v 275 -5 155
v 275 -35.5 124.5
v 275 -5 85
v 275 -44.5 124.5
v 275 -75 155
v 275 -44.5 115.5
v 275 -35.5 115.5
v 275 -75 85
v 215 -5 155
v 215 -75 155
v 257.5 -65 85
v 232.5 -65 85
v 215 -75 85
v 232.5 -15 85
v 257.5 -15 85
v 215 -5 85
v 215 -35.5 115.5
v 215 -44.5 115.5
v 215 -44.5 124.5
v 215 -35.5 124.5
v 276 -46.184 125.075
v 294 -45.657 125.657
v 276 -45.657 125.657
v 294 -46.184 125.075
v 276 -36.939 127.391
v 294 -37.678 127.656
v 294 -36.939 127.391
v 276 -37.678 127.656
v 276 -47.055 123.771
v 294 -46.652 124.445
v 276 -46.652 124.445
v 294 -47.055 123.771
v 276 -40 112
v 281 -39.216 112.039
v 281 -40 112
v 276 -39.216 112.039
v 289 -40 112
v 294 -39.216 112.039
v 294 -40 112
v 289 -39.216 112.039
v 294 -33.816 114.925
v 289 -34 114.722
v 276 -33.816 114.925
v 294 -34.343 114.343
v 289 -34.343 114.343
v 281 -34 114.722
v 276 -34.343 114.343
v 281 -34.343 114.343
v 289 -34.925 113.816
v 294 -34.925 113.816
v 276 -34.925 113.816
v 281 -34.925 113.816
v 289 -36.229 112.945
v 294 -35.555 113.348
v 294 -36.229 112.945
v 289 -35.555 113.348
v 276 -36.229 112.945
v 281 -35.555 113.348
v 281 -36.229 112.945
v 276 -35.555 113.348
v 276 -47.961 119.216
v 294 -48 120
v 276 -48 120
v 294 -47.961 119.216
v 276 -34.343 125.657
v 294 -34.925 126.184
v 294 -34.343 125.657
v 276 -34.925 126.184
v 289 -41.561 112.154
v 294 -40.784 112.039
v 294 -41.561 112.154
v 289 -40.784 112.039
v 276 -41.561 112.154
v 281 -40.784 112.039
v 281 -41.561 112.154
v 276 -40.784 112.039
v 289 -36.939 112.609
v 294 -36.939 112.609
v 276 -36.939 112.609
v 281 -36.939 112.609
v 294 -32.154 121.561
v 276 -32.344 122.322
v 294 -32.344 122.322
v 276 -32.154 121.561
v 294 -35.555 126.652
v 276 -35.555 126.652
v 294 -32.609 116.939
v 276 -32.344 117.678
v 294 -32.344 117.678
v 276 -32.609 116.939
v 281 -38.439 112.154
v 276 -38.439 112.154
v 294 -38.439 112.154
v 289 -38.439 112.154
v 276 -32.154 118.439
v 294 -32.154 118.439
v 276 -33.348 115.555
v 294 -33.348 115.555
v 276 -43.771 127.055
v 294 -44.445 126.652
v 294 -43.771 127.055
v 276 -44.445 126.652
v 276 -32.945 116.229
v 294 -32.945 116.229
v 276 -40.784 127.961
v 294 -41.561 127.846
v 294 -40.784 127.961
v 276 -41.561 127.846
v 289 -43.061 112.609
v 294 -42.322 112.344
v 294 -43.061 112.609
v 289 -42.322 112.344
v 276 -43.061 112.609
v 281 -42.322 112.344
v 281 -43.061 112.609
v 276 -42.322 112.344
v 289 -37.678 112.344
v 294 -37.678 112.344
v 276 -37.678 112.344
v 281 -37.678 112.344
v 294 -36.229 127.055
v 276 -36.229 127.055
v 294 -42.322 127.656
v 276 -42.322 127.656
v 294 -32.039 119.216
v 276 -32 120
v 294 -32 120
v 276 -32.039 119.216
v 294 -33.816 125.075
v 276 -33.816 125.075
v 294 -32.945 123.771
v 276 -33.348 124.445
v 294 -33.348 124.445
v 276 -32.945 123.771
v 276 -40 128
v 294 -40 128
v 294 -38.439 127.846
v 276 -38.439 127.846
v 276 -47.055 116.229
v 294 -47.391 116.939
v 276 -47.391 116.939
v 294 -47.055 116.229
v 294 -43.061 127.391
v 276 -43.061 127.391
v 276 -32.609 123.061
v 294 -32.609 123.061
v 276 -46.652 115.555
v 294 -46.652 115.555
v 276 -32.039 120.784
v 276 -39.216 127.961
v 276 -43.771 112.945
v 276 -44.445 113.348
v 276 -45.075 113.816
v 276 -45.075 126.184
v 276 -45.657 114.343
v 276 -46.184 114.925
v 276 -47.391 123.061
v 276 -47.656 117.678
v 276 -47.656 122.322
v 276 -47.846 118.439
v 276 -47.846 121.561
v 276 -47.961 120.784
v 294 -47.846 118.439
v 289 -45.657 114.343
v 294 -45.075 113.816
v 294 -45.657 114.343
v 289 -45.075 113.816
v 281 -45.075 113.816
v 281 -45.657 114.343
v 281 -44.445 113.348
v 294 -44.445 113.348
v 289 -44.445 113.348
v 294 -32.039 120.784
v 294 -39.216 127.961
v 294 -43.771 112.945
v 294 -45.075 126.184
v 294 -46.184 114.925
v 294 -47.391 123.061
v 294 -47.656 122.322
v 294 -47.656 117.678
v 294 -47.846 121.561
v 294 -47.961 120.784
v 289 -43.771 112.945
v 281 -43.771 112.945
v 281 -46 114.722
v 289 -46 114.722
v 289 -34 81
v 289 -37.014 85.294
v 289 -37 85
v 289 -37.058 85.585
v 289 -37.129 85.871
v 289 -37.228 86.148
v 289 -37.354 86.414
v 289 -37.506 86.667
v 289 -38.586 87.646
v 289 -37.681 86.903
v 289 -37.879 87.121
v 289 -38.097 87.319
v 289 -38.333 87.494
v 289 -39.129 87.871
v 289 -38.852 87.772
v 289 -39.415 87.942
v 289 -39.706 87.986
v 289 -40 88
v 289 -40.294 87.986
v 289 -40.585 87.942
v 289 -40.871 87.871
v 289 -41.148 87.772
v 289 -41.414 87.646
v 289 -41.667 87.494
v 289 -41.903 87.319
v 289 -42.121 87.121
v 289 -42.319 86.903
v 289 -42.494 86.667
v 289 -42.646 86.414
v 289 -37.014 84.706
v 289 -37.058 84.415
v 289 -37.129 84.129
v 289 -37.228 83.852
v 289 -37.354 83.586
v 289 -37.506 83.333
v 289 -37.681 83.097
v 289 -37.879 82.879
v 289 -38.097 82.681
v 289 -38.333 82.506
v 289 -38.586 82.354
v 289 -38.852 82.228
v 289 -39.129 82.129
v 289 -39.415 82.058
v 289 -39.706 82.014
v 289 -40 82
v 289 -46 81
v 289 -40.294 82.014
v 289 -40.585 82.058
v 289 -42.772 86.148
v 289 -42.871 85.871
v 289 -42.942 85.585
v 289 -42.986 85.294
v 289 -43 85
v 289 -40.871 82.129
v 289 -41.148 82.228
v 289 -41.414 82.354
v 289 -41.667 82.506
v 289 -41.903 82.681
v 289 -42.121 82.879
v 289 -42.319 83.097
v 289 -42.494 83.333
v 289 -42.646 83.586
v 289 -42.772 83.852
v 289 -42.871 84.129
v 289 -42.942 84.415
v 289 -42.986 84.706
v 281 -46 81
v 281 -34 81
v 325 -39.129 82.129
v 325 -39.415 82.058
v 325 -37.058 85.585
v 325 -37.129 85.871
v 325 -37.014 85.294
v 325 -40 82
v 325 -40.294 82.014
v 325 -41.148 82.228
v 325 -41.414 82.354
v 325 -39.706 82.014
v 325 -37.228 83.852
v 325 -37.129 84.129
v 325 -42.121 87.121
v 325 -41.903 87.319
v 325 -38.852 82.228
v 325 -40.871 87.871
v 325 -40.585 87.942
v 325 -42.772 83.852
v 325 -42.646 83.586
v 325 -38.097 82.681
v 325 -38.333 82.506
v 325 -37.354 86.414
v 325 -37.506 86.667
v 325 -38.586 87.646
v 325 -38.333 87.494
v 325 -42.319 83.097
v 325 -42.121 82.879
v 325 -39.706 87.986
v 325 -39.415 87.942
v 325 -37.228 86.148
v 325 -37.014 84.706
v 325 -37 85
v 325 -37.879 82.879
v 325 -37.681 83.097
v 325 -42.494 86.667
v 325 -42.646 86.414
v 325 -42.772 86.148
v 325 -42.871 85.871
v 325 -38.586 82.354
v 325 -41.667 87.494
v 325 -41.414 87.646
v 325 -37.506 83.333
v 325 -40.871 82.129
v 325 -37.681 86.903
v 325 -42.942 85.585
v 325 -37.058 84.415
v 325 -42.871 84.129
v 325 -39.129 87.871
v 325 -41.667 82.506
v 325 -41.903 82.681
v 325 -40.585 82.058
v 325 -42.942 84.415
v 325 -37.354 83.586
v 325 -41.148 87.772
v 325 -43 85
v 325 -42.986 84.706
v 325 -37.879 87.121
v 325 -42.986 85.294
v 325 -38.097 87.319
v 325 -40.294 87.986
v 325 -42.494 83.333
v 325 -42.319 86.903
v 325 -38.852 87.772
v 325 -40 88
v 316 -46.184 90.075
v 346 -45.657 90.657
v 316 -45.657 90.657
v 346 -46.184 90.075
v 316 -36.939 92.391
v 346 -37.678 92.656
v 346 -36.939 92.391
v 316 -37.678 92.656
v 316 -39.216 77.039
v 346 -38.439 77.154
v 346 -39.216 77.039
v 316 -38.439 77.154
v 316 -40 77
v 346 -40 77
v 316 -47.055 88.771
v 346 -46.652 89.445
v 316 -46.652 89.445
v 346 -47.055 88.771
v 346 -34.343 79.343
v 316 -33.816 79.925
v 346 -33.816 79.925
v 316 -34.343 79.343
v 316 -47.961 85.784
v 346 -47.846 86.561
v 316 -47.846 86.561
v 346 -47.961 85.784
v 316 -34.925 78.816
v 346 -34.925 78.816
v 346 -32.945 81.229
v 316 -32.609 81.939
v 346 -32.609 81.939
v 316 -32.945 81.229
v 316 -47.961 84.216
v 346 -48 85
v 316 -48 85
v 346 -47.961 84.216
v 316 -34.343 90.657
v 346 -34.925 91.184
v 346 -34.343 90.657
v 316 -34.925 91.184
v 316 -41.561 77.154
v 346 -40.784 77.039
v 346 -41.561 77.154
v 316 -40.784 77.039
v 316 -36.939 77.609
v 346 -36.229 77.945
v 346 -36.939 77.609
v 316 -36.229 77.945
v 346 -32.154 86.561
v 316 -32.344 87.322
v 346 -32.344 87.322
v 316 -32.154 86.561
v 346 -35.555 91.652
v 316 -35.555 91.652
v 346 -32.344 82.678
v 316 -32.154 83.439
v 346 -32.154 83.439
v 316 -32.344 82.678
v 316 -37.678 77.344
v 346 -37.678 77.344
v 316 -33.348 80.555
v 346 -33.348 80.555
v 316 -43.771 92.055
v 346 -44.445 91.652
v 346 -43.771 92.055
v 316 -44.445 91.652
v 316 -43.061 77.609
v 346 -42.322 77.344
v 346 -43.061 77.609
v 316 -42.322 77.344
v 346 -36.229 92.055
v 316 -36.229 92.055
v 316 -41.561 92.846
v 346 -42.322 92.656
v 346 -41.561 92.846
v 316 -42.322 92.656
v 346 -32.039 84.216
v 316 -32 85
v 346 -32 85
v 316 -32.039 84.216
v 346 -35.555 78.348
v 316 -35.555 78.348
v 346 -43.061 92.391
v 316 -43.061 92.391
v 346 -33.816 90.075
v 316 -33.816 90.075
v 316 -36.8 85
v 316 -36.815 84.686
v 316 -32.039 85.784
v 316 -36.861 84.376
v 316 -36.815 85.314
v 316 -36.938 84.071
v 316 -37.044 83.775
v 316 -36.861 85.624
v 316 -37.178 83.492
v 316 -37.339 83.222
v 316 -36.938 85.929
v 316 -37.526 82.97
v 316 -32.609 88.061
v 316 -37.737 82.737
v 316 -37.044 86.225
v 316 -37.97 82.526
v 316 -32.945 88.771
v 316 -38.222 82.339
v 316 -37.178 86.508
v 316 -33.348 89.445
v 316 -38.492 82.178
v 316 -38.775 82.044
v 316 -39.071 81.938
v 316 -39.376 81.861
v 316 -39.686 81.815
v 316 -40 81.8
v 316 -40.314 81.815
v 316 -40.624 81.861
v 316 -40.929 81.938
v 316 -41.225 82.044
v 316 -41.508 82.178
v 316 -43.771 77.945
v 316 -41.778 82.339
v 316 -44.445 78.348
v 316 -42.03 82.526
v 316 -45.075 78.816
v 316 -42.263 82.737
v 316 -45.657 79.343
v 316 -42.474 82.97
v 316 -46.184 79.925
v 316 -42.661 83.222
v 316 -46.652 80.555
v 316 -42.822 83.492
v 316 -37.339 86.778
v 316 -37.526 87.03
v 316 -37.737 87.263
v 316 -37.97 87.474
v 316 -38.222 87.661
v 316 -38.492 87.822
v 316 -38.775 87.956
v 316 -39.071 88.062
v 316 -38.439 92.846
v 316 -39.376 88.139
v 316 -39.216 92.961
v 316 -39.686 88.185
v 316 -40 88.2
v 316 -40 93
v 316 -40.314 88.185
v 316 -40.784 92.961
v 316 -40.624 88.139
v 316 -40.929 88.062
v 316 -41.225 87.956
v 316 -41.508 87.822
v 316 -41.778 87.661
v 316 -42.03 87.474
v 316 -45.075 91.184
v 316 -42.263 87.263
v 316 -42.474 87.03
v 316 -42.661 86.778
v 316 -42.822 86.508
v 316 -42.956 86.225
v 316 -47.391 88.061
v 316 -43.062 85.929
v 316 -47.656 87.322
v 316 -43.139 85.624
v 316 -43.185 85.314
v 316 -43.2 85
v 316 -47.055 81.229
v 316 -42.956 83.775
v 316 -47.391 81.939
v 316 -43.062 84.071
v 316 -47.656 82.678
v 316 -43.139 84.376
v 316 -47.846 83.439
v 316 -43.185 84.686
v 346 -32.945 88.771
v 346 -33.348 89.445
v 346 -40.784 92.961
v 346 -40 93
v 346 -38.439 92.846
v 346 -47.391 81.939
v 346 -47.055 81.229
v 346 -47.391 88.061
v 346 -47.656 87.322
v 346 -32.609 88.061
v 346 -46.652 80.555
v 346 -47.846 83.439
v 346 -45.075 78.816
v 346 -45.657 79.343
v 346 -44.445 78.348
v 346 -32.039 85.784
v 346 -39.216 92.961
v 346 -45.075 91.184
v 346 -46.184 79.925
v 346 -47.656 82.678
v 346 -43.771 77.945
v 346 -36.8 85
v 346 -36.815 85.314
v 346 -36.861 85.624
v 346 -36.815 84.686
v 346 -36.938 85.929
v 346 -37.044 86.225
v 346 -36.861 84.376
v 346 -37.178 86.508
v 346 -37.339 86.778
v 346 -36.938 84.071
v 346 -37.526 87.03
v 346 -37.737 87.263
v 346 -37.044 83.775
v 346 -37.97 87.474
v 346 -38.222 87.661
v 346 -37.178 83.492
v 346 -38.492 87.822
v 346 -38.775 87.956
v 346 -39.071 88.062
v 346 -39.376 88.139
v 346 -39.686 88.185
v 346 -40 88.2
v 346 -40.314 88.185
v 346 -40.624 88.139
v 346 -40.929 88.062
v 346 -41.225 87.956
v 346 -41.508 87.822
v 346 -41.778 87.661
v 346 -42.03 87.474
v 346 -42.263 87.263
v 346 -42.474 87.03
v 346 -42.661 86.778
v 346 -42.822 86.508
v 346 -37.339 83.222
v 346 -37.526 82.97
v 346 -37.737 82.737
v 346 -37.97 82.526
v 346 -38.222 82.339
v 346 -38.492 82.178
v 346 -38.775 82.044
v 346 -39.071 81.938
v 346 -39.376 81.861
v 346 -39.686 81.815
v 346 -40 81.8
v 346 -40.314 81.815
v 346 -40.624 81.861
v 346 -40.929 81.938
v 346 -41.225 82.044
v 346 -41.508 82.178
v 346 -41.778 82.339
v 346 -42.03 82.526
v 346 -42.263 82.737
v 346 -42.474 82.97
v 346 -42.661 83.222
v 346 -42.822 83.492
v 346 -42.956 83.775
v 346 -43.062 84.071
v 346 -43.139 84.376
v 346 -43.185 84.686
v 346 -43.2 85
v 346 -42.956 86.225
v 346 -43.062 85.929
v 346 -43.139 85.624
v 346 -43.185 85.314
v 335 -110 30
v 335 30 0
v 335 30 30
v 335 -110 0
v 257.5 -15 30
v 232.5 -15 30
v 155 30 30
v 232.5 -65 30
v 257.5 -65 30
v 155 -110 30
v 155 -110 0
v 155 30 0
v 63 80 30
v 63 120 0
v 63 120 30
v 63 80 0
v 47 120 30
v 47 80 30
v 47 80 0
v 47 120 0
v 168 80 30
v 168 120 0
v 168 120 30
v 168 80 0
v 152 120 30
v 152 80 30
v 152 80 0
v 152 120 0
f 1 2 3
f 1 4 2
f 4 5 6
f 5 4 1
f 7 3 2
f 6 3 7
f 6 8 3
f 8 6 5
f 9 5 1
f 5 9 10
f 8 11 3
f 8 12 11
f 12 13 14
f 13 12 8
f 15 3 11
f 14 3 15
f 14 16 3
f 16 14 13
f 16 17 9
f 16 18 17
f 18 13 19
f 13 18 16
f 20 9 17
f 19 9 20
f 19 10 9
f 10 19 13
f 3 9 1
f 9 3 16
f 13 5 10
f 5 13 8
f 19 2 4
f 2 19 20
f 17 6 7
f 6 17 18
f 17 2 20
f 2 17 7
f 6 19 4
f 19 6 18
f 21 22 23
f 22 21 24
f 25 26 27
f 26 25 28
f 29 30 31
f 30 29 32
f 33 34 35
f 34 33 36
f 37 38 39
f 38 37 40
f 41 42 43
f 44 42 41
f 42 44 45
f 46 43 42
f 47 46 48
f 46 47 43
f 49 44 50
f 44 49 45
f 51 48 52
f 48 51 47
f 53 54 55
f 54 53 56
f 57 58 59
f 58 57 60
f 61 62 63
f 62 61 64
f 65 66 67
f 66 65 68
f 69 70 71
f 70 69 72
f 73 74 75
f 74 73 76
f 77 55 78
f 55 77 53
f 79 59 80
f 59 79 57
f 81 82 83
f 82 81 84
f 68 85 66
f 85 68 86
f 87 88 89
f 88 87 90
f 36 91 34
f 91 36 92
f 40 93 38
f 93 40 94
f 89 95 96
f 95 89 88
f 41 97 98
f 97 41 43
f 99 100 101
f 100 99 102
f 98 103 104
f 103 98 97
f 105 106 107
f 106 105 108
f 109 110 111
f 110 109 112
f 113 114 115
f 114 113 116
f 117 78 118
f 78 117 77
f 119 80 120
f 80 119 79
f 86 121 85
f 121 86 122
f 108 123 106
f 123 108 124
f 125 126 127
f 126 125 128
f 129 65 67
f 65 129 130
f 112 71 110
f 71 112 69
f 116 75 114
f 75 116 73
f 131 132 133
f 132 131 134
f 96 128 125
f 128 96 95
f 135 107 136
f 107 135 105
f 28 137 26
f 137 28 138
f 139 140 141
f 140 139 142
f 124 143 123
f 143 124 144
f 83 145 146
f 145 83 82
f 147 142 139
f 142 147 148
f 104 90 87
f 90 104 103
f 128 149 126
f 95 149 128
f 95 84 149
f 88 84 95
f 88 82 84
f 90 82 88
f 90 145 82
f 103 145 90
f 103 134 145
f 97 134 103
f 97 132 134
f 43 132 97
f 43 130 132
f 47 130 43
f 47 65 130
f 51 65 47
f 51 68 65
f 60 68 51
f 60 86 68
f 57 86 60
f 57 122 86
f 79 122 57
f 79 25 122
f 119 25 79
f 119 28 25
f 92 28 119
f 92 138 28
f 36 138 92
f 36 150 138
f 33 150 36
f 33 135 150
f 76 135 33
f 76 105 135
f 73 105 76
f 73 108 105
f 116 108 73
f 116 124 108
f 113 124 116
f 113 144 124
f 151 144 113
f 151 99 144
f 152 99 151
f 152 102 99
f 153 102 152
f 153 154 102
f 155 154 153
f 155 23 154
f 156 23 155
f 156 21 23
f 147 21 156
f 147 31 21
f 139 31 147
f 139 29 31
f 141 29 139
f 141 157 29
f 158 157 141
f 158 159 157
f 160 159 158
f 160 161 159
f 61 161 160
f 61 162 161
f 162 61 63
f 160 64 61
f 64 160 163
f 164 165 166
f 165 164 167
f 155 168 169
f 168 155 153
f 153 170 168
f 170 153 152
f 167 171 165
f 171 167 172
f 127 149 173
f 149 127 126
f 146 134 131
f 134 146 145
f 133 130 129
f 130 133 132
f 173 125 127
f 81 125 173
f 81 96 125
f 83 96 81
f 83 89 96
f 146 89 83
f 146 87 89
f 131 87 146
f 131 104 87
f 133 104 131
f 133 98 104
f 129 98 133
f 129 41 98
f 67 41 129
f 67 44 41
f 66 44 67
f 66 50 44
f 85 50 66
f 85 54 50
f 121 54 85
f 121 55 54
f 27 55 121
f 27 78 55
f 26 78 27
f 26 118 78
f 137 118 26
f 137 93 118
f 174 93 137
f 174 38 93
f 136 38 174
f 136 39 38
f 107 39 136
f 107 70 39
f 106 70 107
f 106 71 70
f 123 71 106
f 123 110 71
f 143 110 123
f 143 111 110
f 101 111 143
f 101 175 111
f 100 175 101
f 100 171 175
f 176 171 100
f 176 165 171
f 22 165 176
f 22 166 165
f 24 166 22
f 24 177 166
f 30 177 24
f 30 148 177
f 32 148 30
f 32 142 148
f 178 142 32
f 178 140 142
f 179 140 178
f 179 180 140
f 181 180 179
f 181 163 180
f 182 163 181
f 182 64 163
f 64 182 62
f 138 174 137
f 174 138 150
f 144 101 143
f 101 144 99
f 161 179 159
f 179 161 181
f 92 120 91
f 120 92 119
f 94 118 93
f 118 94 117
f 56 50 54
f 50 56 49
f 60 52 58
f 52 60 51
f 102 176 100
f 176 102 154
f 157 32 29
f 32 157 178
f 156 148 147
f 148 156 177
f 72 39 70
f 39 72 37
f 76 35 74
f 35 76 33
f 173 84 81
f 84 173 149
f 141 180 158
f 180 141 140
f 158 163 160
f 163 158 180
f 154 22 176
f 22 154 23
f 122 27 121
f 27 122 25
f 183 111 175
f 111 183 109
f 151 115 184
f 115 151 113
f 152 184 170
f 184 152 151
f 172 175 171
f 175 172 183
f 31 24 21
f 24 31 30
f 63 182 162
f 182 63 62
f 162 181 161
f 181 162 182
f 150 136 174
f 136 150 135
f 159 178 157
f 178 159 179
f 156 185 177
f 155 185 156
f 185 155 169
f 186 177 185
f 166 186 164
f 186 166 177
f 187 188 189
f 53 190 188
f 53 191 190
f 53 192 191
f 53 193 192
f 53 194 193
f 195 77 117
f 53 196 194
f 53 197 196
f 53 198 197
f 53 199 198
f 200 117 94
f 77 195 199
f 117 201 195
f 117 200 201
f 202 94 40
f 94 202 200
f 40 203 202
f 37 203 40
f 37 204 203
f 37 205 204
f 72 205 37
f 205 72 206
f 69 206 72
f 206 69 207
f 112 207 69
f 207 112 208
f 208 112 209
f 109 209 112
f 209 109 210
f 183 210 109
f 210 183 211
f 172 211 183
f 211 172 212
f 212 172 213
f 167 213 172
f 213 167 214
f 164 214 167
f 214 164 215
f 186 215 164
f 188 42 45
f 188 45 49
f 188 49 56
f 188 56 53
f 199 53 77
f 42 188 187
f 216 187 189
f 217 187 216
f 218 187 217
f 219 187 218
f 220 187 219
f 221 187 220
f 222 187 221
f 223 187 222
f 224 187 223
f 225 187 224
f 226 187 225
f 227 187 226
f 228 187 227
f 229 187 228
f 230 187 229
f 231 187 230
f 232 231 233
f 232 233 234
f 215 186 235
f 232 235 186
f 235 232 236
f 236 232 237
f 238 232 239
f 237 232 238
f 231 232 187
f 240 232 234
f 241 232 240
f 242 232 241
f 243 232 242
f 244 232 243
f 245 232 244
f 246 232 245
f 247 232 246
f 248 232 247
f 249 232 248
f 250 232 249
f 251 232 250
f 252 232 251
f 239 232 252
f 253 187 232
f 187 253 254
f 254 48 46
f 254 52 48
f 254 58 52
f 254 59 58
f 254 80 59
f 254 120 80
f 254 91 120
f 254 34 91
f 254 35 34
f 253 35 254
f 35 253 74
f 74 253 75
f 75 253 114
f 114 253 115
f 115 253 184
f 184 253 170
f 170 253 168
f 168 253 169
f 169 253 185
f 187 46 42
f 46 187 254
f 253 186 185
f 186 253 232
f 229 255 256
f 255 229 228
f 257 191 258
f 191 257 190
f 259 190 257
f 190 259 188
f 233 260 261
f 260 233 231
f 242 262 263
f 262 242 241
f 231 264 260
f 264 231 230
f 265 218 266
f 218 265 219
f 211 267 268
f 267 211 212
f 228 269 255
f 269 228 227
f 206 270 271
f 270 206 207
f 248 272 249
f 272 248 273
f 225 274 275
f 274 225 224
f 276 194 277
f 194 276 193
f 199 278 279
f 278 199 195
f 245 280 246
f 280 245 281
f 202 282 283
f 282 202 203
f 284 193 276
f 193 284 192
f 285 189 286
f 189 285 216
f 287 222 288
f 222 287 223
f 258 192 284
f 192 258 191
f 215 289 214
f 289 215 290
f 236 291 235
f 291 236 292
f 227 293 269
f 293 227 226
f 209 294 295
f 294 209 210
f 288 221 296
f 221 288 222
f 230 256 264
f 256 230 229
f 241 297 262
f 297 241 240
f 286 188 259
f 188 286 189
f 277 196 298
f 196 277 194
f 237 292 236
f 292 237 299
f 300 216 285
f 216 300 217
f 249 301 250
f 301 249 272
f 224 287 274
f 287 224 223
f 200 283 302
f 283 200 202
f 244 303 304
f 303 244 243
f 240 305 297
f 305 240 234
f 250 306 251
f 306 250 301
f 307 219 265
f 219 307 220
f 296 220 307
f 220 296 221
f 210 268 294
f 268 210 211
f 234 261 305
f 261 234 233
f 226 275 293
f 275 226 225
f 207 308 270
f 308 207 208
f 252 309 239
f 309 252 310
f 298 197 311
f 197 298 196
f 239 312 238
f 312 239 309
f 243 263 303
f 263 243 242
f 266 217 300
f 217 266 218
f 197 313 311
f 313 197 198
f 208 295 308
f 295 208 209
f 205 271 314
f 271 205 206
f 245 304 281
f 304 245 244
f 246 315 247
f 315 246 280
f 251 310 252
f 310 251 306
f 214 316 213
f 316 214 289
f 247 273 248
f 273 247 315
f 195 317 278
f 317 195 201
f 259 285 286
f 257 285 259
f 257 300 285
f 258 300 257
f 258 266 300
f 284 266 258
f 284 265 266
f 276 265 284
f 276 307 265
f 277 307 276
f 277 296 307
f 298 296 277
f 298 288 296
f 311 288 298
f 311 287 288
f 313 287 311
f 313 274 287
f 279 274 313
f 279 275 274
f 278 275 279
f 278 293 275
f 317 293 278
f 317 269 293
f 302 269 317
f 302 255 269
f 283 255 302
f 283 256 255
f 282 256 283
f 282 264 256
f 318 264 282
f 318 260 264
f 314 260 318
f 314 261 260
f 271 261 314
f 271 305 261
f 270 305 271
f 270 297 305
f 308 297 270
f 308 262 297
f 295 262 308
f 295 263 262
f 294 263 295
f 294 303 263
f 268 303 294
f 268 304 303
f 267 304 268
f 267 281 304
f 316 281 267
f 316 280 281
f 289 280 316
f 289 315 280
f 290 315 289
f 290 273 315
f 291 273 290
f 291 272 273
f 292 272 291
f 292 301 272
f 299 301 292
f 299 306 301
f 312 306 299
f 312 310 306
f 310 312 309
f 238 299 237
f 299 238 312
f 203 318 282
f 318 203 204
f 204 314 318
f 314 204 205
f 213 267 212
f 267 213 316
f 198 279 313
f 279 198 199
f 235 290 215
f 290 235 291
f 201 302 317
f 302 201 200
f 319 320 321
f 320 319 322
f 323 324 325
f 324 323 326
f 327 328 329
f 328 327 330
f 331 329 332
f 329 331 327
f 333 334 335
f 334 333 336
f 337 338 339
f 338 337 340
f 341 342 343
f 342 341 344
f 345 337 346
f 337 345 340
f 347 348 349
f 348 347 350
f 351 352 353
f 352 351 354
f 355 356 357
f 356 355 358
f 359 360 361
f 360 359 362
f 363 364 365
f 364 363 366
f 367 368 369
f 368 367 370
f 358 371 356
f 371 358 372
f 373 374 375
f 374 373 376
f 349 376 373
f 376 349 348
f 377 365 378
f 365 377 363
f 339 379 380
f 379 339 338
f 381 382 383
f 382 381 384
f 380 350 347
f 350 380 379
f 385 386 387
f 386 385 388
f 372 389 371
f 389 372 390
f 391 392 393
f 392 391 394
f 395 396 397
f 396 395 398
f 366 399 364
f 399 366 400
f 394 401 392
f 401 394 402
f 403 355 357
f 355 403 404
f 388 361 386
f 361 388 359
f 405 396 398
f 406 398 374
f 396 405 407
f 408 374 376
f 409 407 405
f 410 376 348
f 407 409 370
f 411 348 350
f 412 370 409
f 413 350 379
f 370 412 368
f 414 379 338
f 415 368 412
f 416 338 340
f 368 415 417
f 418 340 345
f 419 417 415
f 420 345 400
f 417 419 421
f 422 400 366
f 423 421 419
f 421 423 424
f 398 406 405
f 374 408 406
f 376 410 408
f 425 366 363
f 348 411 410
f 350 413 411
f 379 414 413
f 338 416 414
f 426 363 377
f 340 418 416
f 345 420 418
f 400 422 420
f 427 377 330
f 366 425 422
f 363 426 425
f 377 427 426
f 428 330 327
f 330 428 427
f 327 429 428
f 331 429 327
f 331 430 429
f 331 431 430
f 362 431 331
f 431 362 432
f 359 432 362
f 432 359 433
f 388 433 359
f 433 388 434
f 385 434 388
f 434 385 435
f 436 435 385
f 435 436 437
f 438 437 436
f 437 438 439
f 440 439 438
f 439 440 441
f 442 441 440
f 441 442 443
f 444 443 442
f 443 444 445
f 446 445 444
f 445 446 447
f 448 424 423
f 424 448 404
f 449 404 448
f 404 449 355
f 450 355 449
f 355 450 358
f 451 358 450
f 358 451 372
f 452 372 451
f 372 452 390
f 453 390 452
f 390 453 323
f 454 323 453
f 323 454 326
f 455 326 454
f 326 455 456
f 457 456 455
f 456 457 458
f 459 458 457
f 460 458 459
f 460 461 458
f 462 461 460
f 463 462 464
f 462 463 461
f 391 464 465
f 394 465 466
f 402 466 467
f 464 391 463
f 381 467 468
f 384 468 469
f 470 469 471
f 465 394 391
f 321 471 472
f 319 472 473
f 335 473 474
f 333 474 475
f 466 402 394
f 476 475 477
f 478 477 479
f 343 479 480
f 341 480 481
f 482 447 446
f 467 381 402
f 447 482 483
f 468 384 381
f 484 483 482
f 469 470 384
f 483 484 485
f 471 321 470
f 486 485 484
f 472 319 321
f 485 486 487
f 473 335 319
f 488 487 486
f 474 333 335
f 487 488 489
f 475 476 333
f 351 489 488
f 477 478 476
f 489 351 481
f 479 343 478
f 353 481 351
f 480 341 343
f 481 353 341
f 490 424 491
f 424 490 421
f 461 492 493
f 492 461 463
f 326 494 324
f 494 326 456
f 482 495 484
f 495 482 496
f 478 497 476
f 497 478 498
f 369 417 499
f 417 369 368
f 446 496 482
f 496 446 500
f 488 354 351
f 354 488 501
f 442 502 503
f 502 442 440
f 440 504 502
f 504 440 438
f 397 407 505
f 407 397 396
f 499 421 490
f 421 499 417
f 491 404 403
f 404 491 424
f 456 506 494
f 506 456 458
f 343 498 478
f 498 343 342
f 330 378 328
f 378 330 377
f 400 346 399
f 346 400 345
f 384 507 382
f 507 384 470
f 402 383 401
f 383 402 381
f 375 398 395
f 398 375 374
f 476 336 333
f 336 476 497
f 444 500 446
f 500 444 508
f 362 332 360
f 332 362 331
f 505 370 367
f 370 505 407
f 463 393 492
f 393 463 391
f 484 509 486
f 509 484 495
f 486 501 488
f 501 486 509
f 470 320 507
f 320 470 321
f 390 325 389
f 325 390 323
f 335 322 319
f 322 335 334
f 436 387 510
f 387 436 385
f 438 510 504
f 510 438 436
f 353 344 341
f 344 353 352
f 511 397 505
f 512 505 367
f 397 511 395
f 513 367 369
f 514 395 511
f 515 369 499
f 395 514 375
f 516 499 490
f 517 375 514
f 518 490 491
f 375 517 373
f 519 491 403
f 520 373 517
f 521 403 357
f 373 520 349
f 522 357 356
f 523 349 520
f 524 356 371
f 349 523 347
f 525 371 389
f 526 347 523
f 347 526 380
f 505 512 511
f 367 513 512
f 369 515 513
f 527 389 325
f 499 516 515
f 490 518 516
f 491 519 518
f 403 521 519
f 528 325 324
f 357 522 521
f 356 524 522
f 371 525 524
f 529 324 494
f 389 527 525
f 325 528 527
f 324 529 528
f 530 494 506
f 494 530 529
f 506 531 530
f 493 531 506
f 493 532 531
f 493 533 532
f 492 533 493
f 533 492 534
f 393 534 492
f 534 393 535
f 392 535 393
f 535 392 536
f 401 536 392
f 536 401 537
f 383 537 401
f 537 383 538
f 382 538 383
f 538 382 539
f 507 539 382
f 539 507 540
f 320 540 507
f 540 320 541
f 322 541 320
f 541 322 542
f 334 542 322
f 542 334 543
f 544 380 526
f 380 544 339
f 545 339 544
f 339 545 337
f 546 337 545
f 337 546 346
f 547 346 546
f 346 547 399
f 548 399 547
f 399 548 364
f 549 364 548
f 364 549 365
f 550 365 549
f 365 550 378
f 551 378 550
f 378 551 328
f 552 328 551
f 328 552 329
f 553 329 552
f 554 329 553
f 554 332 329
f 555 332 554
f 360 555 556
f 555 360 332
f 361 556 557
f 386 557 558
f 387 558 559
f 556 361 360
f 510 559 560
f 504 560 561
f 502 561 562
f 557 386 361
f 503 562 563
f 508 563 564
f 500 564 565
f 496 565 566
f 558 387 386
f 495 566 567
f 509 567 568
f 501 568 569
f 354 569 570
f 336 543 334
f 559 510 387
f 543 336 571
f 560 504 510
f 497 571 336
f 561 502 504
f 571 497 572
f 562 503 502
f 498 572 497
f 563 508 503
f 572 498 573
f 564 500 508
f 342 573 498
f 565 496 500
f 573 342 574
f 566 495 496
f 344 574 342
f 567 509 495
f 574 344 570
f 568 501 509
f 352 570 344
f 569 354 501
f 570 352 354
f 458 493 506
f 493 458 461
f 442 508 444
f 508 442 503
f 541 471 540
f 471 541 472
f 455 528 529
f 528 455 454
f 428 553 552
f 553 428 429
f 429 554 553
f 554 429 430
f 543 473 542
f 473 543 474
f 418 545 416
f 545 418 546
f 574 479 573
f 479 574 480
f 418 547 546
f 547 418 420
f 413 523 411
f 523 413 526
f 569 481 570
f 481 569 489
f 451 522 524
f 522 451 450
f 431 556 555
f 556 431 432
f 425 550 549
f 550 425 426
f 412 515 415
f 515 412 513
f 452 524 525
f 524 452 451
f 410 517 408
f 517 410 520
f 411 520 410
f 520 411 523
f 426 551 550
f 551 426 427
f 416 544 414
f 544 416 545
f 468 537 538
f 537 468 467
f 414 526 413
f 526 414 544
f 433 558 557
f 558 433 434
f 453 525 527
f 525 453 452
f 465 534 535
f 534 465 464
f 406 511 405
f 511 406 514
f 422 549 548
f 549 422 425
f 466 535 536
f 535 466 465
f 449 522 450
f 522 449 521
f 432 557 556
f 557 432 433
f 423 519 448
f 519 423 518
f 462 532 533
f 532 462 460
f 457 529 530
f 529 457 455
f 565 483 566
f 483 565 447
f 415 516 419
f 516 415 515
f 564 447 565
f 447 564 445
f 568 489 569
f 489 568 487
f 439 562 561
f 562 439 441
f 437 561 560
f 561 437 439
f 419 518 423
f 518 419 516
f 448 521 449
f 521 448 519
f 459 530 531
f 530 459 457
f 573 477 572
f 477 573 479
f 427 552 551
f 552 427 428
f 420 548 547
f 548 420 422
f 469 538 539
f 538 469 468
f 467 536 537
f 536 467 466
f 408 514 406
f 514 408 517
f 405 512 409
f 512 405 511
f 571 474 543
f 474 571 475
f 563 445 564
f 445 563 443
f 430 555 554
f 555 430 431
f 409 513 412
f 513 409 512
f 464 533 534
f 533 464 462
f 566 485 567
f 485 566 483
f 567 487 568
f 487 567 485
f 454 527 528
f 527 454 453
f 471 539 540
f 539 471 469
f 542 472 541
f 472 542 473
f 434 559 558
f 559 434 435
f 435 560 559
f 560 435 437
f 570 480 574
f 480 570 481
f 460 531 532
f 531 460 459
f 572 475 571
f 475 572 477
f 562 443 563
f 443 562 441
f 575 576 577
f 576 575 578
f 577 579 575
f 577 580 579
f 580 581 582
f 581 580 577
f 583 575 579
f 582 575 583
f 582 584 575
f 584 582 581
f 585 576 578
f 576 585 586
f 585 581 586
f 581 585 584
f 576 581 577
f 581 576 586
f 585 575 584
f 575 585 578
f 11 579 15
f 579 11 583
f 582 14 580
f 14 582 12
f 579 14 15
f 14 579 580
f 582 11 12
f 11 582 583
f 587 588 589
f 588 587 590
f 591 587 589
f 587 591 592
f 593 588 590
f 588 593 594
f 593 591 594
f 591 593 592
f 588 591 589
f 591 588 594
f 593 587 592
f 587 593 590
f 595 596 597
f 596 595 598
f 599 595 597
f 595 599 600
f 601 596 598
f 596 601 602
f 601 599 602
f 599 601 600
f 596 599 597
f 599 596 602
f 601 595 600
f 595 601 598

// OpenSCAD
// Dimensions in millimetres. Geometry reference for the guide-mounted fixture.
// MIT licensed. This does not specify a functioning cutting assembly.
// Install an ordinary manual-feed crank sharpener on a guided, ballasted base
// for real trials; cutters remain enclosed in the commercial housing.
$fn=64;
part="assembly"; // assembly, base, post, case, crank, knob, cradle
module base(){cube([180,140,30],center=true);}
module post(){cube([25,50,55],center=true);}
module case(){difference(){cube([60,70,70],center=true);cube([62,9,9],center=true);}}
module crank(){
 rotate([0,90,0])cylinder(h=18,r=8,center=true);
 translate([0,0,-17.5])cube([8,12,43],center=true);
 translate([20,0,-35])rotate([0,90,0])cylinder(h=40,r=3,center=true);
}
module knob(){rotate([0,90,0])difference(){cylinder(h=30,r=8,center=true);cylinder(h=32,r=3.2,center=true);}}
module cradle(){cube([16,40,30],center=true);}
if(part=="base")base();
else if(part=="post")post();
else if(part=="case")case();
else if(part=="crank")crank();
else if(part=="knob")knob();
else if(part=="cradle")cradle();
else {
 translate([245,-40,15])base();
 translate([245,-40,57.5])post();
 translate([245,-40,120])case();
 translate([285,-40,120])crank();
 translate([331,-40,85])knob();
 translate([55,100,15])cradle();
 translate([160,100,15])cradle();
}
